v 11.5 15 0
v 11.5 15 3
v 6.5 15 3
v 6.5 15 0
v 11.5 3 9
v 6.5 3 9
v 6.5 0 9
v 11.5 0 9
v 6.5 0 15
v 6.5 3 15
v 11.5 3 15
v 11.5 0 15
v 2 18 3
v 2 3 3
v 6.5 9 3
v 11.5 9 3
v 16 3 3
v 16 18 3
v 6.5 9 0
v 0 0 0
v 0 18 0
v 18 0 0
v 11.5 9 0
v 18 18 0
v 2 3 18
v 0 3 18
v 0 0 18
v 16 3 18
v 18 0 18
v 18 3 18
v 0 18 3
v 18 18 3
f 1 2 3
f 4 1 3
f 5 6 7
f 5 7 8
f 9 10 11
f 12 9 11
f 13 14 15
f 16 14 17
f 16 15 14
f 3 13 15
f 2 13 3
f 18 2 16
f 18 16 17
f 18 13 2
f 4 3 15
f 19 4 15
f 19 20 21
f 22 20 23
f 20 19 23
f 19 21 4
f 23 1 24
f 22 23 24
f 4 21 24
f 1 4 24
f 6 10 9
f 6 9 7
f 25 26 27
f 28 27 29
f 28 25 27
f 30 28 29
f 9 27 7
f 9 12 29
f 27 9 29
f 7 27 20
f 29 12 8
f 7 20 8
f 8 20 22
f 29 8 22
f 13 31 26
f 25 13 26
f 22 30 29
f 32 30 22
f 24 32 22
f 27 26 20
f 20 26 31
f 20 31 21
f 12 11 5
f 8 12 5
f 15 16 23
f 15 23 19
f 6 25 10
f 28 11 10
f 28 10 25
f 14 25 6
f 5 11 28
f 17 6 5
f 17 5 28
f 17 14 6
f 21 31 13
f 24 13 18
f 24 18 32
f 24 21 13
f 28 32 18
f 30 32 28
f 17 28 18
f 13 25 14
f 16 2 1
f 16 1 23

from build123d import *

# Parameters (mm, degrees)
SKETCH1_W          = 18
SKETCH1_H          = 18
EXTRUDE1_DEPTH     = 3
SKETCH2_W          = 18
SKETCH2_H          = 3
EXTRUDE2_DEPTH     = 15
EXTRUDE3_DEPTH     = 2
EXTRUDE4_DEPTH     = 2
CUT_EXTRUDE1_REACH = 5
SKETCH7_W          = 5
SKETCH7_H          = 6
CUT_EXTRUDE2_REACH = 5
SKETCH8_W          = 5
SKETCH8_H          = 6


with BuildPart() as part:
    # Sketch1 → Extrude1 (new body)
    with BuildSketch(Plane.XY):
        with Locations((9, 9)):
            Rectangle(SKETCH1_W, SKETCH1_H)
    extrude(amount=EXTRUDE1_DEPTH)

    # Sketch2 → Extrude2 (add)
    with BuildSketch(Plane.XY.offset(3)):
        with Locations((9, 1.5)):
            Rectangle(SKETCH2_W, SKETCH2_H)
    extrude(amount=EXTRUDE2_DEPTH)

    # Sketch5 → Extrude3 (add)
    with BuildSketch(Plane(origin=(18, 0, 0), x_dir=(0, 0, -1), z_dir=(1, 0, 0))):
        Polygon((-3, 18), (-18, 3), (-3, 3), align=None)
    extrude(amount=-EXTRUDE3_DEPTH)

    # Sketch6 → Extrude4 (add)
    with BuildSketch(Plane.ZY):
        Polygon((3, 18), (18, 3), (3, 3), align=None)
    extrude(amount=-EXTRUDE4_DEPTH)

    # Sketch7 → Cut-Extrude1 (cut, up to next)
    with BuildSketch(Plane(origin=(0, 3, 0), x_dir=(1, 0, 0), z_dir=(0, 1, 0)), mode=Mode.PRIVATE) as cut_extrude1_sk1:
        with Locations((9, -12)):
            Rectangle(SKETCH7_W, SKETCH7_H)
    cut_extrude1_tool1 = extrude(cut_extrude1_sk1.sketch, amount=-CUT_EXTRUDE1_REACH, mode=Mode.PRIVATE) & part.part
    add(cut_extrude1_tool1.solids().sort_by_distance((9, 3, 12))[0], mode=Mode.SUBTRACT)

    # Sketch8 → Cut-Extrude2 (cut, up to next)
    with BuildSketch(Plane(origin=(0, 0, 3), x_dir=(-1, 0, 0), z_dir=(0, 0, 1)), mode=Mode.PRIVATE) as cut_extrude2_sk1:
        with Locations((-9, -12)):
            Rectangle(SKETCH8_W, SKETCH8_H)
    cut_extrude2_tool1 = extrude(cut_extrude2_sk1.sketch, amount=-CUT_EXTRUDE2_REACH, mode=Mode.PRIVATE) & part.part
    add(cut_extrude2_tool1.solids().sort_by_distance((9, 12, 3))[0], mode=Mode.SUBTRACT)


solid = part.part
